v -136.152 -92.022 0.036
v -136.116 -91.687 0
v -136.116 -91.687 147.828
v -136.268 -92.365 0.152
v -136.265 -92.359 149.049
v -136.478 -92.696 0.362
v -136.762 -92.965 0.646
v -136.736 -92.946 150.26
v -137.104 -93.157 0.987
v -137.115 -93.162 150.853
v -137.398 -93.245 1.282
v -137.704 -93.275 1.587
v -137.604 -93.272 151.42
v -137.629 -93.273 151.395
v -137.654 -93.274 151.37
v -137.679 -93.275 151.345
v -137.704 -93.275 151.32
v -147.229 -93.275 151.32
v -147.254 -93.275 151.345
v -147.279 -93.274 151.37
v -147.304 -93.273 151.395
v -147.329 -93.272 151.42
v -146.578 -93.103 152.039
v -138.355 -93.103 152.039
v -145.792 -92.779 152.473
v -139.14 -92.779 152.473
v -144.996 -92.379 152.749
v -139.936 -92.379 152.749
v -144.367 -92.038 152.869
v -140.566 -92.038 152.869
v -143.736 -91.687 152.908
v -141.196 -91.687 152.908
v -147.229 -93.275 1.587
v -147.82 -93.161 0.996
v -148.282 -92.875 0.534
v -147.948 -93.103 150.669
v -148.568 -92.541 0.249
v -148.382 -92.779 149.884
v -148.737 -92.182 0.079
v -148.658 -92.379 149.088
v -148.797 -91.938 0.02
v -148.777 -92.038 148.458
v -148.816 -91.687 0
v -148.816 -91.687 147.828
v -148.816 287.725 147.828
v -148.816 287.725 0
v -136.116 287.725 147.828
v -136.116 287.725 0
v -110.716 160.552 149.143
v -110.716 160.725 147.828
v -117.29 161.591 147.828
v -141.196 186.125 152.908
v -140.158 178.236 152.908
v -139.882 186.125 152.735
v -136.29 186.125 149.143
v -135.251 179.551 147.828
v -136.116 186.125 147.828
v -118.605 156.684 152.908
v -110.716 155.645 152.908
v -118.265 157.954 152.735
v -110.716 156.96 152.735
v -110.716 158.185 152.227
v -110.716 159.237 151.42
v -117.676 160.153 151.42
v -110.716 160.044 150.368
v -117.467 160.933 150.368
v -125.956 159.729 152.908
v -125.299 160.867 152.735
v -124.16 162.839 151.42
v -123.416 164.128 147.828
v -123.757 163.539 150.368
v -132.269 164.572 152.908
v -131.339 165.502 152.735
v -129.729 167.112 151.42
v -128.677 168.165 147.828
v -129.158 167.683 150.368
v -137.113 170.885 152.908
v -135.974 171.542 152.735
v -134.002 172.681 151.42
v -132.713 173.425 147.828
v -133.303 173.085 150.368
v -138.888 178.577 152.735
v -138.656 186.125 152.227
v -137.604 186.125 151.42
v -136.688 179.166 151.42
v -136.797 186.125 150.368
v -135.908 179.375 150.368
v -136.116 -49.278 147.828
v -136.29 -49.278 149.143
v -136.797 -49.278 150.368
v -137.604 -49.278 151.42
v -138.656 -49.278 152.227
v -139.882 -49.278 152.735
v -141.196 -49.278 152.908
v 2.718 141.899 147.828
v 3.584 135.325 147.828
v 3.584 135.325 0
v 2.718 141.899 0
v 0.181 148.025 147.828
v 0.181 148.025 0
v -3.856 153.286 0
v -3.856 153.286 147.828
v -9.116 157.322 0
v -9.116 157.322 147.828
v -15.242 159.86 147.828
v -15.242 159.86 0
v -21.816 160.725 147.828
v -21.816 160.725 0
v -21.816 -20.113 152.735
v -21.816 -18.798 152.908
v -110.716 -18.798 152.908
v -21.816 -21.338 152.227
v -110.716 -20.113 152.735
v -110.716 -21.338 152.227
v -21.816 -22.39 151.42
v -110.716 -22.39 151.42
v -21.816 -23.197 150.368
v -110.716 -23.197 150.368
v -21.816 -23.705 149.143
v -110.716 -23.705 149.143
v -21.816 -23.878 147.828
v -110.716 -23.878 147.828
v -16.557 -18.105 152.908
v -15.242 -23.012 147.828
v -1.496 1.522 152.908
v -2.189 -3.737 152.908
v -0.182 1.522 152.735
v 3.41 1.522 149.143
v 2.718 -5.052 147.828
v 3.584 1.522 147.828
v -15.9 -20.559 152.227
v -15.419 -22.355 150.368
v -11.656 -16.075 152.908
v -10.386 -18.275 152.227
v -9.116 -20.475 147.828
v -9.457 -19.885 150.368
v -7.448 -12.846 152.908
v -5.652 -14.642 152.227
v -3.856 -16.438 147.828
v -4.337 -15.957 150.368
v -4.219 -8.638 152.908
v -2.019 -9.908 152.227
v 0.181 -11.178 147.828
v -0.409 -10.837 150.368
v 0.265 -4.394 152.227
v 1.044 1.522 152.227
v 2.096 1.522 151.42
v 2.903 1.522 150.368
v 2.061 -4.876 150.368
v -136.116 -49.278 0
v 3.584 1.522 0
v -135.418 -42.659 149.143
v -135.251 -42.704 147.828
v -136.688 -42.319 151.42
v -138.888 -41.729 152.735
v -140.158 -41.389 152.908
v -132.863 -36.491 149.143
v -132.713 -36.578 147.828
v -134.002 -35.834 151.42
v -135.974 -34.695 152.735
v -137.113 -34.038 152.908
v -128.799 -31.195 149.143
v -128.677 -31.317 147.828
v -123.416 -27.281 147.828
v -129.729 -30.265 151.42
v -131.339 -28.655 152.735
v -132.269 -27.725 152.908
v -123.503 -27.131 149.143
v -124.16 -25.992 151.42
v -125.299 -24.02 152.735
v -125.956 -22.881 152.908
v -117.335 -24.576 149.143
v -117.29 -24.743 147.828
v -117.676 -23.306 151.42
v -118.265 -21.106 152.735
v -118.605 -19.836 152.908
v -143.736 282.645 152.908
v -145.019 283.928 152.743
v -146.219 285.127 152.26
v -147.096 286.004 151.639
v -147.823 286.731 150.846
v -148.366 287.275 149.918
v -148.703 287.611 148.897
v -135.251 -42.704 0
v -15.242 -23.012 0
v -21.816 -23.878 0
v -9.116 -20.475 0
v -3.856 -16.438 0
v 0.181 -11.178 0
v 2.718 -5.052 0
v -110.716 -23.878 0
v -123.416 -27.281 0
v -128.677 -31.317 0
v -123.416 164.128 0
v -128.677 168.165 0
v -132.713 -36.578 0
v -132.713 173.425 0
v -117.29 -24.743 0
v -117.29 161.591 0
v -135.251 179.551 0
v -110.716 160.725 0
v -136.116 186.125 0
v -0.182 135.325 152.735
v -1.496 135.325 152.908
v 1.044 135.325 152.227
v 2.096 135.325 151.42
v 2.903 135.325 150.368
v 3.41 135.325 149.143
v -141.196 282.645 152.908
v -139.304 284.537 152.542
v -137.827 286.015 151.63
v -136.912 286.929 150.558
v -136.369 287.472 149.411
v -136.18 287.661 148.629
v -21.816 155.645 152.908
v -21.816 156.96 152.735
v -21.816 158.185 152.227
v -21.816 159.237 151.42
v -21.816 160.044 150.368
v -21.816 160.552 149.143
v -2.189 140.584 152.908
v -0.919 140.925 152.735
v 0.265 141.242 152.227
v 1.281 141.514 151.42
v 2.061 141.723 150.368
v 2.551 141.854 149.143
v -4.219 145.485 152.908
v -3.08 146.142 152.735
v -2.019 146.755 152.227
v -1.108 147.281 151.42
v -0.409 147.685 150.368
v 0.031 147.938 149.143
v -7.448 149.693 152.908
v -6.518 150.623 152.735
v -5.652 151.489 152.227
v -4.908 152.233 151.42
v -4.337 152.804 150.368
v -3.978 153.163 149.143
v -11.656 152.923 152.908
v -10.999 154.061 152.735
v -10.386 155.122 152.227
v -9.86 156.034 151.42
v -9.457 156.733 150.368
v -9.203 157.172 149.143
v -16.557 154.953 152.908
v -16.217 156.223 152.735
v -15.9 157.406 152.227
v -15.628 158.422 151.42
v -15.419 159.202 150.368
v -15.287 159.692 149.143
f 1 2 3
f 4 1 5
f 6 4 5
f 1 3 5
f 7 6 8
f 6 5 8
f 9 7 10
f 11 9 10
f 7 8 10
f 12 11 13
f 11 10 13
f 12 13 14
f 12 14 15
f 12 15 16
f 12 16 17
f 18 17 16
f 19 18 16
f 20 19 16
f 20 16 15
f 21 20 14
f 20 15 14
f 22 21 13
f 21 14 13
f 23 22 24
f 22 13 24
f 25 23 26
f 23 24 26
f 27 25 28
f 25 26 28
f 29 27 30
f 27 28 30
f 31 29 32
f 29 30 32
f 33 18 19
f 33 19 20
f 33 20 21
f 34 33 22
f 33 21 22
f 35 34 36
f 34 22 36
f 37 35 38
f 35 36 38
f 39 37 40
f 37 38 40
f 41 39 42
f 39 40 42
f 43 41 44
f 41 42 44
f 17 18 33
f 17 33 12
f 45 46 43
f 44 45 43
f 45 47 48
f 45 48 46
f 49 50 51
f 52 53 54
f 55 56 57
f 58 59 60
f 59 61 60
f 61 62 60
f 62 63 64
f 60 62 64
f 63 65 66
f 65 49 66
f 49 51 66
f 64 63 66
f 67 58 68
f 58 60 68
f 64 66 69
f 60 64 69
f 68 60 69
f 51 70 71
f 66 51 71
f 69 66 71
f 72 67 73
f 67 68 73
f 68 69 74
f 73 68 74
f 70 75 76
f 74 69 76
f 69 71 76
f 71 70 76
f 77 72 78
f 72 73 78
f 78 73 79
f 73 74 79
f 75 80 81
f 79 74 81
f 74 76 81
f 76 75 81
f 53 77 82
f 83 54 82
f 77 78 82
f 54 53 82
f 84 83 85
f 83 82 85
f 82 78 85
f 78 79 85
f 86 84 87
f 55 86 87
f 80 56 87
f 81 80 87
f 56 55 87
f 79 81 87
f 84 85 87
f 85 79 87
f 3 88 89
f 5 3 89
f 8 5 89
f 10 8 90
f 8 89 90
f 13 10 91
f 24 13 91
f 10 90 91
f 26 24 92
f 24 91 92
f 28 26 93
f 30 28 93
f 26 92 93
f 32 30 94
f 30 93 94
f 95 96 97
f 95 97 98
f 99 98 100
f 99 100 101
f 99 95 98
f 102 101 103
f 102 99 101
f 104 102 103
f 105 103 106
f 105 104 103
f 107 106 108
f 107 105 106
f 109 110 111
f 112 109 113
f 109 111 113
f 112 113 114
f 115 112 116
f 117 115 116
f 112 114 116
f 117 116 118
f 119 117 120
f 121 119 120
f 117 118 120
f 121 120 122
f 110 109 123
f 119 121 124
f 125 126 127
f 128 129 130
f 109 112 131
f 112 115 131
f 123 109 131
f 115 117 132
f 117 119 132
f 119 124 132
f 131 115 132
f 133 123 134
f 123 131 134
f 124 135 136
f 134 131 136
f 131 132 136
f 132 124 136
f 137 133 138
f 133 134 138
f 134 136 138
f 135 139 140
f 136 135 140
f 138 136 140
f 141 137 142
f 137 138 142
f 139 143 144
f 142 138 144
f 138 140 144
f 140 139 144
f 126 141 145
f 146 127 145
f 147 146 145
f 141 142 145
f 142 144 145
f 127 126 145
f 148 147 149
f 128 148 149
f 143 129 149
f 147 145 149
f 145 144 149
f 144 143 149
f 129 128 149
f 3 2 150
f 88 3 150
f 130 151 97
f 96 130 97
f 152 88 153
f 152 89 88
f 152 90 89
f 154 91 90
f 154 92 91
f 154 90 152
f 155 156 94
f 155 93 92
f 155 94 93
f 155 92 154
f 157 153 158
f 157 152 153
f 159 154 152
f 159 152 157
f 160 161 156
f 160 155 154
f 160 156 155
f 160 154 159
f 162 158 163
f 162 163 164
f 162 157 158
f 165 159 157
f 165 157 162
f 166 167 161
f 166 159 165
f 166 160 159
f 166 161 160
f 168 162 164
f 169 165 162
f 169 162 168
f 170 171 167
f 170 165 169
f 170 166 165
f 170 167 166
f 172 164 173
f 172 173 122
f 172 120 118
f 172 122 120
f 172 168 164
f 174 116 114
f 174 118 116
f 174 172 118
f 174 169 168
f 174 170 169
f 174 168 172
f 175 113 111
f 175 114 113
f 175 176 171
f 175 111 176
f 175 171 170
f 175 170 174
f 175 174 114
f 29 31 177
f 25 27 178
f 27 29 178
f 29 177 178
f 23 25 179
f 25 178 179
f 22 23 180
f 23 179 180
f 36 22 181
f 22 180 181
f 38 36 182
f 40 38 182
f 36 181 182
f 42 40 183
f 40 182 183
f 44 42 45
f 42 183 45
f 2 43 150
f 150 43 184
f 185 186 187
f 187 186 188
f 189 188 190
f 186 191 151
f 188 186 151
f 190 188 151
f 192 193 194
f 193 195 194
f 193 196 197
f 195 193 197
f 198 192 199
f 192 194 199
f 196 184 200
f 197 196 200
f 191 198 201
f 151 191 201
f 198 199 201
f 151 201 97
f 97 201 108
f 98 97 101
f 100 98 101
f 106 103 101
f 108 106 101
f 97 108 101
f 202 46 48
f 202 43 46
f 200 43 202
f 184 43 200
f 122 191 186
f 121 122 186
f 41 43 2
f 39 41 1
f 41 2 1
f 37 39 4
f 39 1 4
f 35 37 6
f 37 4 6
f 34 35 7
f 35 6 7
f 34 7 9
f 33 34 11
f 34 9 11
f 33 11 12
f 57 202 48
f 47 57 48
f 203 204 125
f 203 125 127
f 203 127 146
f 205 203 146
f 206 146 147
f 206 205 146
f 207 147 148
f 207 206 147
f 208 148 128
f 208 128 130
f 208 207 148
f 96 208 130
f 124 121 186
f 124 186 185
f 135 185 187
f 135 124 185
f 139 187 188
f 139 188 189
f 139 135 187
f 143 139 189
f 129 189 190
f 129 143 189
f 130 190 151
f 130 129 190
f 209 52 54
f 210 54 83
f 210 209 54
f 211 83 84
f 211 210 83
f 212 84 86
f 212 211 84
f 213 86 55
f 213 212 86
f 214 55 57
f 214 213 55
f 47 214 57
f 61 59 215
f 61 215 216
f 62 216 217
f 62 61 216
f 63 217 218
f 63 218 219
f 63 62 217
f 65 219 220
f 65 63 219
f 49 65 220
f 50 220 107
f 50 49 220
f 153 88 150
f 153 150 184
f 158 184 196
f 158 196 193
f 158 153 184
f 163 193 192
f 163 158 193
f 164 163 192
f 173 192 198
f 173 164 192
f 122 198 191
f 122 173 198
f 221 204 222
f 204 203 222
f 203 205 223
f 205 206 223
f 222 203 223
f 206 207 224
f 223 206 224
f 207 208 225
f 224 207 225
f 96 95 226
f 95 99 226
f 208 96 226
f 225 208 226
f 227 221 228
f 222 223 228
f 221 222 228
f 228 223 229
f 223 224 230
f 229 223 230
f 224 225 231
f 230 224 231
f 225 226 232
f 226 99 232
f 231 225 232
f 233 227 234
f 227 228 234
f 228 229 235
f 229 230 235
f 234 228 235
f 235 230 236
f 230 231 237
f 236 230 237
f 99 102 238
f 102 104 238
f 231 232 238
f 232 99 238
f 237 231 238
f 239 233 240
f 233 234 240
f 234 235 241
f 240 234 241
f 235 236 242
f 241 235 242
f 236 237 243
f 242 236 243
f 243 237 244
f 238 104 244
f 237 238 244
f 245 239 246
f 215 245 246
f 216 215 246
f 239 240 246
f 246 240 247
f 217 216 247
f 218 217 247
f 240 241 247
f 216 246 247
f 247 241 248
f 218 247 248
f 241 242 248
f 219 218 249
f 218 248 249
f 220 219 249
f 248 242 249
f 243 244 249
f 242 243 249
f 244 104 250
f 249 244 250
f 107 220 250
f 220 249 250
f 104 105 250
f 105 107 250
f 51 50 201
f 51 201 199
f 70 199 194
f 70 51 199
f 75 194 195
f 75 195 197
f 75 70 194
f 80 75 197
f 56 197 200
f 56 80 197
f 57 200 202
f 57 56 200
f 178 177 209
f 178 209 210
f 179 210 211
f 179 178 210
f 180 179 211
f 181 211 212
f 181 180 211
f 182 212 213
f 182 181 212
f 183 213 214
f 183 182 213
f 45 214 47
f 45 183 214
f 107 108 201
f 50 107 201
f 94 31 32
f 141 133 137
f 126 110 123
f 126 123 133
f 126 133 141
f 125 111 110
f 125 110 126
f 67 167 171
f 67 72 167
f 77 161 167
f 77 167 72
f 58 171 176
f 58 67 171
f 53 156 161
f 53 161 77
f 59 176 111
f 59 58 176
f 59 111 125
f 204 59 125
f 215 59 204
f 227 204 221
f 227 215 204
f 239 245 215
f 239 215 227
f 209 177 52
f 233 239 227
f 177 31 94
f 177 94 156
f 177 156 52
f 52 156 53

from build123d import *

# Parameters (mm, degrees)
F1_DEPTH     = 152.908
F2_R         = 25.4
F3_R         = 1.5875
F4_T1_DEPTH  = 55.1097300731
F4_T3_DEPTH  = 404.8125
F4_T5_DEPTH  = 88.9
F4_T7_DEPTH  = 38.1
F4_T9_DEPTH  = 114.3
F4_T11_DEPTH = 133.8027699269
F4_T14_ANGLE = 90
F4_T16_ANGLE = 90
F4_T18_ANGLE = 90
F4_T20_ANGLE = 90


# Not quite as in the source:
# - a fillet or chamfer that OpenCascade refuses, or shapes differently, is made with other operations: its cross-section is extruded or revolved along the edge and cut away or added


with BuildPart() as f1:
    # F0 (on Top) → F1 (new body)
    with BuildSketch(Plane.XY):
        Polygon((-148.8164286077, -93.2749655156), (-136.1164286077, -93.2749655156), (-136.1164286077, -23.8777354426), (3.5835713923, -23.8777354426), (3.5835713923, 160.7250344844), (-136.1164286077, 160.7250344844), (-136.1164286077, 287.7250344844), (-148.8164286077, 287.7250344844), align=None)
    extrude(amount=F1_DEPTH)

    # F2
    f2_edges = [f1.edges().sort_by_distance(p)[0] for p in [
        (-136.116429, -23.877735, 76.454),
        (3.583571, -23.877735, 76.454),
        (3.583571, 160.725034, 76.454),
        (-136.116429, 160.725034, 76.454),
    ]]
    fillet(f2_edges, radius=F2_R)

    # F3
    f3_edges = [f1.edges().sort_by_distance(p)[0] for p in [
        (-148.816429, -93.274966, 76.454),
        (-136.116429, -93.274966, 76.454),
        (-142.466429, -93.274966, 0),
        (-142.466429, -93.274966, 152.908),
    ]]
    fillet(f3_edges, radius=F3_R)

    # F4: fillet of radius 5.08 on 12 edges, made by hand

    # F4_s2 → F4_t1 (cut)
    with BuildSketch(Plane.XZ.offset(49.2777354426)):
        with BuildLine():
            ThreePointArc((-136.1164286077, 147.828), (-137.6043261593, 151.4201024484), (-141.1964286077, 152.908))
            Line((-141.1964286077, 152.908), (-136.1164286077, 152.908))
            Line((-136.1164286077, 152.908), (-136.1164286077, 147.828))
        make_face()
    extrude(amount=F4_T1_DEPTH, mode=Mode.SUBTRACT)

    # F4_s4 → F4_t3 (cut)
    with BuildSketch(Plane.XZ.offset(-300.4250344844)):
        with BuildLine():
            ThreePointArc((-143.7364286077, 152.908), (-147.3285310561, 151.4201024484), (-148.8164286077, 147.828))
            Line((-148.8164286077, 147.828), (-148.8164286077, 152.908))
            Line((-148.8164286077, 152.908), (-143.7364286077, 152.908))
        make_face()
    extrude(amount=F4_T3_DEPTH, mode=Mode.SUBTRACT)

    # F4_s6 → F4_t5 (cut)
    with BuildSketch(Plane.YZ.offset(-110.7164286077)):
        with BuildLine():
            ThreePointArc((-18.7977354426, 152.908), (-22.389837891, 151.4201024484), (-23.8777354426, 147.828))
            Line((-23.8777354426, 147.828), (-23.8777354426, 152.908))
            Line((-23.8777354426, 152.908), (-18.7977354426, 152.908))
        make_face()
        with BuildLine():
            ThreePointArc((155.6450344844, 152.908), (159.2371369328, 151.4201024484), (160.7250344844, 147.828))
            Line((160.7250344844, 147.828), (160.7250344844, 152.908))
            Line((160.7250344844, 152.908), (155.6450344844, 152.908))
        make_face()
    extrude(amount=F4_T5_DEPTH, mode=Mode.SUBTRACT)

    # F4_s8 → F4_t7 (cut)
    with BuildSketch(Plane.YZ.offset(-161.5164286077)):
        with BuildLine():
            ThreePointArc((282.6450344844, 152.908), (286.2371369328, 151.4201024484), (287.7250344844, 147.828))
            Line((287.7250344844, 147.828), (287.7250344844, 152.908))
            Line((287.7250344844, 152.908), (282.6450344844, 152.908))
        make_face()
    extrude(amount=F4_T7_DEPTH, mode=Mode.SUBTRACT)

    # F4_s10 → F4_t9 (cut)
    with BuildSketch(Plane.XZ.offset(-300.4250344844)):
        with BuildLine():
            ThreePointArc((-141.1964286077, 152.908), (-137.6043261593, 151.4201024484), (-136.1164286077, 147.828))
            Line((-136.1164286077, 147.828), (-136.1164286077, 152.908))
            Line((-136.1164286077, 152.908), (-141.1964286077, 152.908))
        make_face()
    extrude(amount=F4_T9_DEPTH, mode=Mode.SUBTRACT)

    # F4_s12 → F4_t11 (cut)
    with BuildSketch(Plane.XZ.offset(-135.3250344844)):
        with BuildLine():
            ThreePointArc((-1.4964286077, 152.908), (2.0956738407, 151.4201024484), (3.5835713923, 147.828))
            Line((3.5835713923, 147.828), (3.5835713923, 152.908))
            Line((3.5835713923, 152.908), (-1.4964286077, 152.908))
        make_face()
    extrude(amount=F4_T11_DEPTH, mode=Mode.SUBTRACT)

    # F4_s13 → F4_t14 (revolve, cut)
    with BuildSketch(Plane.XZ.offset(49.2777354426)):
        with BuildLine():
            ThreePointArc((-136.1164286077, 147.828), (-137.6043261593, 151.4201024484), (-141.1964286077, 152.908))
            Line((-141.1964286077, 152.908), (-136.1164286077, 152.908))
            Line((-136.1164286077, 152.908), (-136.1164286077, 147.828))
        make_face()
    revolve(axis=Axis((-110.7164286077, -49.2777354426, 152.908), (0, 0, -1)), revolution_arc=F4_T14_ANGLE, mode=Mode.SUBTRACT)

    # F4_s15 → F4_t16 (revolve, cut)
    with BuildSketch(Plane.YZ.offset(-21.8164286077)):
        with BuildLine():
            ThreePointArc((-18.7977354426, 152.908), (-22.389837891, 151.4201024484), (-23.8777354426, 147.828))
            Line((-23.8777354426, 147.828), (-23.8777354426, 152.908))
            Line((-23.8777354426, 152.908), (-18.7977354426, 152.908))
        make_face()
    revolve(axis=Axis((-21.8164286077, 1.5222645574, 152.908), (0, 0, 1)), revolution_arc=F4_T16_ANGLE, mode=Mode.SUBTRACT)

    # F4_s17 → F4_t18 (revolve, cut)
    with BuildSketch(Plane.YZ.offset(-110.7164286077)):
        with BuildLine():
            ThreePointArc((155.6450344844, 152.908), (159.2371369328, 151.4201024484), (160.7250344844, 147.828))
            Line((160.7250344844, 147.828), (160.7250344844, 152.908))
            Line((160.7250344844, 152.908), (155.6450344844, 152.908))
        make_face()
    revolve(axis=Axis((-110.7164286077, 186.1250344844, 152.908), (0, 0, -1)), revolution_arc=F4_T18_ANGLE, mode=Mode.SUBTRACT)

    # F4_s19 → F4_t20 (revolve, cut)
    with BuildSketch(Plane.XZ.offset(-135.3250344844)):
        with BuildLine():
            ThreePointArc((-1.4964286077, 152.908), (2.0956738407, 151.4201024484), (3.5835713923, 147.828))
            Line((3.5835713923, 147.828), (3.5835713923, 152.908))
            Line((3.5835713923, 152.908), (-1.4964286077, 152.908))
        make_face()
    revolve(axis=Axis((-21.8164286077, 135.3250344844, 152.908), (0, 0, 1)), revolution_arc=F4_T20_ANGLE, mode=Mode.SUBTRACT)


solid = f1.part
